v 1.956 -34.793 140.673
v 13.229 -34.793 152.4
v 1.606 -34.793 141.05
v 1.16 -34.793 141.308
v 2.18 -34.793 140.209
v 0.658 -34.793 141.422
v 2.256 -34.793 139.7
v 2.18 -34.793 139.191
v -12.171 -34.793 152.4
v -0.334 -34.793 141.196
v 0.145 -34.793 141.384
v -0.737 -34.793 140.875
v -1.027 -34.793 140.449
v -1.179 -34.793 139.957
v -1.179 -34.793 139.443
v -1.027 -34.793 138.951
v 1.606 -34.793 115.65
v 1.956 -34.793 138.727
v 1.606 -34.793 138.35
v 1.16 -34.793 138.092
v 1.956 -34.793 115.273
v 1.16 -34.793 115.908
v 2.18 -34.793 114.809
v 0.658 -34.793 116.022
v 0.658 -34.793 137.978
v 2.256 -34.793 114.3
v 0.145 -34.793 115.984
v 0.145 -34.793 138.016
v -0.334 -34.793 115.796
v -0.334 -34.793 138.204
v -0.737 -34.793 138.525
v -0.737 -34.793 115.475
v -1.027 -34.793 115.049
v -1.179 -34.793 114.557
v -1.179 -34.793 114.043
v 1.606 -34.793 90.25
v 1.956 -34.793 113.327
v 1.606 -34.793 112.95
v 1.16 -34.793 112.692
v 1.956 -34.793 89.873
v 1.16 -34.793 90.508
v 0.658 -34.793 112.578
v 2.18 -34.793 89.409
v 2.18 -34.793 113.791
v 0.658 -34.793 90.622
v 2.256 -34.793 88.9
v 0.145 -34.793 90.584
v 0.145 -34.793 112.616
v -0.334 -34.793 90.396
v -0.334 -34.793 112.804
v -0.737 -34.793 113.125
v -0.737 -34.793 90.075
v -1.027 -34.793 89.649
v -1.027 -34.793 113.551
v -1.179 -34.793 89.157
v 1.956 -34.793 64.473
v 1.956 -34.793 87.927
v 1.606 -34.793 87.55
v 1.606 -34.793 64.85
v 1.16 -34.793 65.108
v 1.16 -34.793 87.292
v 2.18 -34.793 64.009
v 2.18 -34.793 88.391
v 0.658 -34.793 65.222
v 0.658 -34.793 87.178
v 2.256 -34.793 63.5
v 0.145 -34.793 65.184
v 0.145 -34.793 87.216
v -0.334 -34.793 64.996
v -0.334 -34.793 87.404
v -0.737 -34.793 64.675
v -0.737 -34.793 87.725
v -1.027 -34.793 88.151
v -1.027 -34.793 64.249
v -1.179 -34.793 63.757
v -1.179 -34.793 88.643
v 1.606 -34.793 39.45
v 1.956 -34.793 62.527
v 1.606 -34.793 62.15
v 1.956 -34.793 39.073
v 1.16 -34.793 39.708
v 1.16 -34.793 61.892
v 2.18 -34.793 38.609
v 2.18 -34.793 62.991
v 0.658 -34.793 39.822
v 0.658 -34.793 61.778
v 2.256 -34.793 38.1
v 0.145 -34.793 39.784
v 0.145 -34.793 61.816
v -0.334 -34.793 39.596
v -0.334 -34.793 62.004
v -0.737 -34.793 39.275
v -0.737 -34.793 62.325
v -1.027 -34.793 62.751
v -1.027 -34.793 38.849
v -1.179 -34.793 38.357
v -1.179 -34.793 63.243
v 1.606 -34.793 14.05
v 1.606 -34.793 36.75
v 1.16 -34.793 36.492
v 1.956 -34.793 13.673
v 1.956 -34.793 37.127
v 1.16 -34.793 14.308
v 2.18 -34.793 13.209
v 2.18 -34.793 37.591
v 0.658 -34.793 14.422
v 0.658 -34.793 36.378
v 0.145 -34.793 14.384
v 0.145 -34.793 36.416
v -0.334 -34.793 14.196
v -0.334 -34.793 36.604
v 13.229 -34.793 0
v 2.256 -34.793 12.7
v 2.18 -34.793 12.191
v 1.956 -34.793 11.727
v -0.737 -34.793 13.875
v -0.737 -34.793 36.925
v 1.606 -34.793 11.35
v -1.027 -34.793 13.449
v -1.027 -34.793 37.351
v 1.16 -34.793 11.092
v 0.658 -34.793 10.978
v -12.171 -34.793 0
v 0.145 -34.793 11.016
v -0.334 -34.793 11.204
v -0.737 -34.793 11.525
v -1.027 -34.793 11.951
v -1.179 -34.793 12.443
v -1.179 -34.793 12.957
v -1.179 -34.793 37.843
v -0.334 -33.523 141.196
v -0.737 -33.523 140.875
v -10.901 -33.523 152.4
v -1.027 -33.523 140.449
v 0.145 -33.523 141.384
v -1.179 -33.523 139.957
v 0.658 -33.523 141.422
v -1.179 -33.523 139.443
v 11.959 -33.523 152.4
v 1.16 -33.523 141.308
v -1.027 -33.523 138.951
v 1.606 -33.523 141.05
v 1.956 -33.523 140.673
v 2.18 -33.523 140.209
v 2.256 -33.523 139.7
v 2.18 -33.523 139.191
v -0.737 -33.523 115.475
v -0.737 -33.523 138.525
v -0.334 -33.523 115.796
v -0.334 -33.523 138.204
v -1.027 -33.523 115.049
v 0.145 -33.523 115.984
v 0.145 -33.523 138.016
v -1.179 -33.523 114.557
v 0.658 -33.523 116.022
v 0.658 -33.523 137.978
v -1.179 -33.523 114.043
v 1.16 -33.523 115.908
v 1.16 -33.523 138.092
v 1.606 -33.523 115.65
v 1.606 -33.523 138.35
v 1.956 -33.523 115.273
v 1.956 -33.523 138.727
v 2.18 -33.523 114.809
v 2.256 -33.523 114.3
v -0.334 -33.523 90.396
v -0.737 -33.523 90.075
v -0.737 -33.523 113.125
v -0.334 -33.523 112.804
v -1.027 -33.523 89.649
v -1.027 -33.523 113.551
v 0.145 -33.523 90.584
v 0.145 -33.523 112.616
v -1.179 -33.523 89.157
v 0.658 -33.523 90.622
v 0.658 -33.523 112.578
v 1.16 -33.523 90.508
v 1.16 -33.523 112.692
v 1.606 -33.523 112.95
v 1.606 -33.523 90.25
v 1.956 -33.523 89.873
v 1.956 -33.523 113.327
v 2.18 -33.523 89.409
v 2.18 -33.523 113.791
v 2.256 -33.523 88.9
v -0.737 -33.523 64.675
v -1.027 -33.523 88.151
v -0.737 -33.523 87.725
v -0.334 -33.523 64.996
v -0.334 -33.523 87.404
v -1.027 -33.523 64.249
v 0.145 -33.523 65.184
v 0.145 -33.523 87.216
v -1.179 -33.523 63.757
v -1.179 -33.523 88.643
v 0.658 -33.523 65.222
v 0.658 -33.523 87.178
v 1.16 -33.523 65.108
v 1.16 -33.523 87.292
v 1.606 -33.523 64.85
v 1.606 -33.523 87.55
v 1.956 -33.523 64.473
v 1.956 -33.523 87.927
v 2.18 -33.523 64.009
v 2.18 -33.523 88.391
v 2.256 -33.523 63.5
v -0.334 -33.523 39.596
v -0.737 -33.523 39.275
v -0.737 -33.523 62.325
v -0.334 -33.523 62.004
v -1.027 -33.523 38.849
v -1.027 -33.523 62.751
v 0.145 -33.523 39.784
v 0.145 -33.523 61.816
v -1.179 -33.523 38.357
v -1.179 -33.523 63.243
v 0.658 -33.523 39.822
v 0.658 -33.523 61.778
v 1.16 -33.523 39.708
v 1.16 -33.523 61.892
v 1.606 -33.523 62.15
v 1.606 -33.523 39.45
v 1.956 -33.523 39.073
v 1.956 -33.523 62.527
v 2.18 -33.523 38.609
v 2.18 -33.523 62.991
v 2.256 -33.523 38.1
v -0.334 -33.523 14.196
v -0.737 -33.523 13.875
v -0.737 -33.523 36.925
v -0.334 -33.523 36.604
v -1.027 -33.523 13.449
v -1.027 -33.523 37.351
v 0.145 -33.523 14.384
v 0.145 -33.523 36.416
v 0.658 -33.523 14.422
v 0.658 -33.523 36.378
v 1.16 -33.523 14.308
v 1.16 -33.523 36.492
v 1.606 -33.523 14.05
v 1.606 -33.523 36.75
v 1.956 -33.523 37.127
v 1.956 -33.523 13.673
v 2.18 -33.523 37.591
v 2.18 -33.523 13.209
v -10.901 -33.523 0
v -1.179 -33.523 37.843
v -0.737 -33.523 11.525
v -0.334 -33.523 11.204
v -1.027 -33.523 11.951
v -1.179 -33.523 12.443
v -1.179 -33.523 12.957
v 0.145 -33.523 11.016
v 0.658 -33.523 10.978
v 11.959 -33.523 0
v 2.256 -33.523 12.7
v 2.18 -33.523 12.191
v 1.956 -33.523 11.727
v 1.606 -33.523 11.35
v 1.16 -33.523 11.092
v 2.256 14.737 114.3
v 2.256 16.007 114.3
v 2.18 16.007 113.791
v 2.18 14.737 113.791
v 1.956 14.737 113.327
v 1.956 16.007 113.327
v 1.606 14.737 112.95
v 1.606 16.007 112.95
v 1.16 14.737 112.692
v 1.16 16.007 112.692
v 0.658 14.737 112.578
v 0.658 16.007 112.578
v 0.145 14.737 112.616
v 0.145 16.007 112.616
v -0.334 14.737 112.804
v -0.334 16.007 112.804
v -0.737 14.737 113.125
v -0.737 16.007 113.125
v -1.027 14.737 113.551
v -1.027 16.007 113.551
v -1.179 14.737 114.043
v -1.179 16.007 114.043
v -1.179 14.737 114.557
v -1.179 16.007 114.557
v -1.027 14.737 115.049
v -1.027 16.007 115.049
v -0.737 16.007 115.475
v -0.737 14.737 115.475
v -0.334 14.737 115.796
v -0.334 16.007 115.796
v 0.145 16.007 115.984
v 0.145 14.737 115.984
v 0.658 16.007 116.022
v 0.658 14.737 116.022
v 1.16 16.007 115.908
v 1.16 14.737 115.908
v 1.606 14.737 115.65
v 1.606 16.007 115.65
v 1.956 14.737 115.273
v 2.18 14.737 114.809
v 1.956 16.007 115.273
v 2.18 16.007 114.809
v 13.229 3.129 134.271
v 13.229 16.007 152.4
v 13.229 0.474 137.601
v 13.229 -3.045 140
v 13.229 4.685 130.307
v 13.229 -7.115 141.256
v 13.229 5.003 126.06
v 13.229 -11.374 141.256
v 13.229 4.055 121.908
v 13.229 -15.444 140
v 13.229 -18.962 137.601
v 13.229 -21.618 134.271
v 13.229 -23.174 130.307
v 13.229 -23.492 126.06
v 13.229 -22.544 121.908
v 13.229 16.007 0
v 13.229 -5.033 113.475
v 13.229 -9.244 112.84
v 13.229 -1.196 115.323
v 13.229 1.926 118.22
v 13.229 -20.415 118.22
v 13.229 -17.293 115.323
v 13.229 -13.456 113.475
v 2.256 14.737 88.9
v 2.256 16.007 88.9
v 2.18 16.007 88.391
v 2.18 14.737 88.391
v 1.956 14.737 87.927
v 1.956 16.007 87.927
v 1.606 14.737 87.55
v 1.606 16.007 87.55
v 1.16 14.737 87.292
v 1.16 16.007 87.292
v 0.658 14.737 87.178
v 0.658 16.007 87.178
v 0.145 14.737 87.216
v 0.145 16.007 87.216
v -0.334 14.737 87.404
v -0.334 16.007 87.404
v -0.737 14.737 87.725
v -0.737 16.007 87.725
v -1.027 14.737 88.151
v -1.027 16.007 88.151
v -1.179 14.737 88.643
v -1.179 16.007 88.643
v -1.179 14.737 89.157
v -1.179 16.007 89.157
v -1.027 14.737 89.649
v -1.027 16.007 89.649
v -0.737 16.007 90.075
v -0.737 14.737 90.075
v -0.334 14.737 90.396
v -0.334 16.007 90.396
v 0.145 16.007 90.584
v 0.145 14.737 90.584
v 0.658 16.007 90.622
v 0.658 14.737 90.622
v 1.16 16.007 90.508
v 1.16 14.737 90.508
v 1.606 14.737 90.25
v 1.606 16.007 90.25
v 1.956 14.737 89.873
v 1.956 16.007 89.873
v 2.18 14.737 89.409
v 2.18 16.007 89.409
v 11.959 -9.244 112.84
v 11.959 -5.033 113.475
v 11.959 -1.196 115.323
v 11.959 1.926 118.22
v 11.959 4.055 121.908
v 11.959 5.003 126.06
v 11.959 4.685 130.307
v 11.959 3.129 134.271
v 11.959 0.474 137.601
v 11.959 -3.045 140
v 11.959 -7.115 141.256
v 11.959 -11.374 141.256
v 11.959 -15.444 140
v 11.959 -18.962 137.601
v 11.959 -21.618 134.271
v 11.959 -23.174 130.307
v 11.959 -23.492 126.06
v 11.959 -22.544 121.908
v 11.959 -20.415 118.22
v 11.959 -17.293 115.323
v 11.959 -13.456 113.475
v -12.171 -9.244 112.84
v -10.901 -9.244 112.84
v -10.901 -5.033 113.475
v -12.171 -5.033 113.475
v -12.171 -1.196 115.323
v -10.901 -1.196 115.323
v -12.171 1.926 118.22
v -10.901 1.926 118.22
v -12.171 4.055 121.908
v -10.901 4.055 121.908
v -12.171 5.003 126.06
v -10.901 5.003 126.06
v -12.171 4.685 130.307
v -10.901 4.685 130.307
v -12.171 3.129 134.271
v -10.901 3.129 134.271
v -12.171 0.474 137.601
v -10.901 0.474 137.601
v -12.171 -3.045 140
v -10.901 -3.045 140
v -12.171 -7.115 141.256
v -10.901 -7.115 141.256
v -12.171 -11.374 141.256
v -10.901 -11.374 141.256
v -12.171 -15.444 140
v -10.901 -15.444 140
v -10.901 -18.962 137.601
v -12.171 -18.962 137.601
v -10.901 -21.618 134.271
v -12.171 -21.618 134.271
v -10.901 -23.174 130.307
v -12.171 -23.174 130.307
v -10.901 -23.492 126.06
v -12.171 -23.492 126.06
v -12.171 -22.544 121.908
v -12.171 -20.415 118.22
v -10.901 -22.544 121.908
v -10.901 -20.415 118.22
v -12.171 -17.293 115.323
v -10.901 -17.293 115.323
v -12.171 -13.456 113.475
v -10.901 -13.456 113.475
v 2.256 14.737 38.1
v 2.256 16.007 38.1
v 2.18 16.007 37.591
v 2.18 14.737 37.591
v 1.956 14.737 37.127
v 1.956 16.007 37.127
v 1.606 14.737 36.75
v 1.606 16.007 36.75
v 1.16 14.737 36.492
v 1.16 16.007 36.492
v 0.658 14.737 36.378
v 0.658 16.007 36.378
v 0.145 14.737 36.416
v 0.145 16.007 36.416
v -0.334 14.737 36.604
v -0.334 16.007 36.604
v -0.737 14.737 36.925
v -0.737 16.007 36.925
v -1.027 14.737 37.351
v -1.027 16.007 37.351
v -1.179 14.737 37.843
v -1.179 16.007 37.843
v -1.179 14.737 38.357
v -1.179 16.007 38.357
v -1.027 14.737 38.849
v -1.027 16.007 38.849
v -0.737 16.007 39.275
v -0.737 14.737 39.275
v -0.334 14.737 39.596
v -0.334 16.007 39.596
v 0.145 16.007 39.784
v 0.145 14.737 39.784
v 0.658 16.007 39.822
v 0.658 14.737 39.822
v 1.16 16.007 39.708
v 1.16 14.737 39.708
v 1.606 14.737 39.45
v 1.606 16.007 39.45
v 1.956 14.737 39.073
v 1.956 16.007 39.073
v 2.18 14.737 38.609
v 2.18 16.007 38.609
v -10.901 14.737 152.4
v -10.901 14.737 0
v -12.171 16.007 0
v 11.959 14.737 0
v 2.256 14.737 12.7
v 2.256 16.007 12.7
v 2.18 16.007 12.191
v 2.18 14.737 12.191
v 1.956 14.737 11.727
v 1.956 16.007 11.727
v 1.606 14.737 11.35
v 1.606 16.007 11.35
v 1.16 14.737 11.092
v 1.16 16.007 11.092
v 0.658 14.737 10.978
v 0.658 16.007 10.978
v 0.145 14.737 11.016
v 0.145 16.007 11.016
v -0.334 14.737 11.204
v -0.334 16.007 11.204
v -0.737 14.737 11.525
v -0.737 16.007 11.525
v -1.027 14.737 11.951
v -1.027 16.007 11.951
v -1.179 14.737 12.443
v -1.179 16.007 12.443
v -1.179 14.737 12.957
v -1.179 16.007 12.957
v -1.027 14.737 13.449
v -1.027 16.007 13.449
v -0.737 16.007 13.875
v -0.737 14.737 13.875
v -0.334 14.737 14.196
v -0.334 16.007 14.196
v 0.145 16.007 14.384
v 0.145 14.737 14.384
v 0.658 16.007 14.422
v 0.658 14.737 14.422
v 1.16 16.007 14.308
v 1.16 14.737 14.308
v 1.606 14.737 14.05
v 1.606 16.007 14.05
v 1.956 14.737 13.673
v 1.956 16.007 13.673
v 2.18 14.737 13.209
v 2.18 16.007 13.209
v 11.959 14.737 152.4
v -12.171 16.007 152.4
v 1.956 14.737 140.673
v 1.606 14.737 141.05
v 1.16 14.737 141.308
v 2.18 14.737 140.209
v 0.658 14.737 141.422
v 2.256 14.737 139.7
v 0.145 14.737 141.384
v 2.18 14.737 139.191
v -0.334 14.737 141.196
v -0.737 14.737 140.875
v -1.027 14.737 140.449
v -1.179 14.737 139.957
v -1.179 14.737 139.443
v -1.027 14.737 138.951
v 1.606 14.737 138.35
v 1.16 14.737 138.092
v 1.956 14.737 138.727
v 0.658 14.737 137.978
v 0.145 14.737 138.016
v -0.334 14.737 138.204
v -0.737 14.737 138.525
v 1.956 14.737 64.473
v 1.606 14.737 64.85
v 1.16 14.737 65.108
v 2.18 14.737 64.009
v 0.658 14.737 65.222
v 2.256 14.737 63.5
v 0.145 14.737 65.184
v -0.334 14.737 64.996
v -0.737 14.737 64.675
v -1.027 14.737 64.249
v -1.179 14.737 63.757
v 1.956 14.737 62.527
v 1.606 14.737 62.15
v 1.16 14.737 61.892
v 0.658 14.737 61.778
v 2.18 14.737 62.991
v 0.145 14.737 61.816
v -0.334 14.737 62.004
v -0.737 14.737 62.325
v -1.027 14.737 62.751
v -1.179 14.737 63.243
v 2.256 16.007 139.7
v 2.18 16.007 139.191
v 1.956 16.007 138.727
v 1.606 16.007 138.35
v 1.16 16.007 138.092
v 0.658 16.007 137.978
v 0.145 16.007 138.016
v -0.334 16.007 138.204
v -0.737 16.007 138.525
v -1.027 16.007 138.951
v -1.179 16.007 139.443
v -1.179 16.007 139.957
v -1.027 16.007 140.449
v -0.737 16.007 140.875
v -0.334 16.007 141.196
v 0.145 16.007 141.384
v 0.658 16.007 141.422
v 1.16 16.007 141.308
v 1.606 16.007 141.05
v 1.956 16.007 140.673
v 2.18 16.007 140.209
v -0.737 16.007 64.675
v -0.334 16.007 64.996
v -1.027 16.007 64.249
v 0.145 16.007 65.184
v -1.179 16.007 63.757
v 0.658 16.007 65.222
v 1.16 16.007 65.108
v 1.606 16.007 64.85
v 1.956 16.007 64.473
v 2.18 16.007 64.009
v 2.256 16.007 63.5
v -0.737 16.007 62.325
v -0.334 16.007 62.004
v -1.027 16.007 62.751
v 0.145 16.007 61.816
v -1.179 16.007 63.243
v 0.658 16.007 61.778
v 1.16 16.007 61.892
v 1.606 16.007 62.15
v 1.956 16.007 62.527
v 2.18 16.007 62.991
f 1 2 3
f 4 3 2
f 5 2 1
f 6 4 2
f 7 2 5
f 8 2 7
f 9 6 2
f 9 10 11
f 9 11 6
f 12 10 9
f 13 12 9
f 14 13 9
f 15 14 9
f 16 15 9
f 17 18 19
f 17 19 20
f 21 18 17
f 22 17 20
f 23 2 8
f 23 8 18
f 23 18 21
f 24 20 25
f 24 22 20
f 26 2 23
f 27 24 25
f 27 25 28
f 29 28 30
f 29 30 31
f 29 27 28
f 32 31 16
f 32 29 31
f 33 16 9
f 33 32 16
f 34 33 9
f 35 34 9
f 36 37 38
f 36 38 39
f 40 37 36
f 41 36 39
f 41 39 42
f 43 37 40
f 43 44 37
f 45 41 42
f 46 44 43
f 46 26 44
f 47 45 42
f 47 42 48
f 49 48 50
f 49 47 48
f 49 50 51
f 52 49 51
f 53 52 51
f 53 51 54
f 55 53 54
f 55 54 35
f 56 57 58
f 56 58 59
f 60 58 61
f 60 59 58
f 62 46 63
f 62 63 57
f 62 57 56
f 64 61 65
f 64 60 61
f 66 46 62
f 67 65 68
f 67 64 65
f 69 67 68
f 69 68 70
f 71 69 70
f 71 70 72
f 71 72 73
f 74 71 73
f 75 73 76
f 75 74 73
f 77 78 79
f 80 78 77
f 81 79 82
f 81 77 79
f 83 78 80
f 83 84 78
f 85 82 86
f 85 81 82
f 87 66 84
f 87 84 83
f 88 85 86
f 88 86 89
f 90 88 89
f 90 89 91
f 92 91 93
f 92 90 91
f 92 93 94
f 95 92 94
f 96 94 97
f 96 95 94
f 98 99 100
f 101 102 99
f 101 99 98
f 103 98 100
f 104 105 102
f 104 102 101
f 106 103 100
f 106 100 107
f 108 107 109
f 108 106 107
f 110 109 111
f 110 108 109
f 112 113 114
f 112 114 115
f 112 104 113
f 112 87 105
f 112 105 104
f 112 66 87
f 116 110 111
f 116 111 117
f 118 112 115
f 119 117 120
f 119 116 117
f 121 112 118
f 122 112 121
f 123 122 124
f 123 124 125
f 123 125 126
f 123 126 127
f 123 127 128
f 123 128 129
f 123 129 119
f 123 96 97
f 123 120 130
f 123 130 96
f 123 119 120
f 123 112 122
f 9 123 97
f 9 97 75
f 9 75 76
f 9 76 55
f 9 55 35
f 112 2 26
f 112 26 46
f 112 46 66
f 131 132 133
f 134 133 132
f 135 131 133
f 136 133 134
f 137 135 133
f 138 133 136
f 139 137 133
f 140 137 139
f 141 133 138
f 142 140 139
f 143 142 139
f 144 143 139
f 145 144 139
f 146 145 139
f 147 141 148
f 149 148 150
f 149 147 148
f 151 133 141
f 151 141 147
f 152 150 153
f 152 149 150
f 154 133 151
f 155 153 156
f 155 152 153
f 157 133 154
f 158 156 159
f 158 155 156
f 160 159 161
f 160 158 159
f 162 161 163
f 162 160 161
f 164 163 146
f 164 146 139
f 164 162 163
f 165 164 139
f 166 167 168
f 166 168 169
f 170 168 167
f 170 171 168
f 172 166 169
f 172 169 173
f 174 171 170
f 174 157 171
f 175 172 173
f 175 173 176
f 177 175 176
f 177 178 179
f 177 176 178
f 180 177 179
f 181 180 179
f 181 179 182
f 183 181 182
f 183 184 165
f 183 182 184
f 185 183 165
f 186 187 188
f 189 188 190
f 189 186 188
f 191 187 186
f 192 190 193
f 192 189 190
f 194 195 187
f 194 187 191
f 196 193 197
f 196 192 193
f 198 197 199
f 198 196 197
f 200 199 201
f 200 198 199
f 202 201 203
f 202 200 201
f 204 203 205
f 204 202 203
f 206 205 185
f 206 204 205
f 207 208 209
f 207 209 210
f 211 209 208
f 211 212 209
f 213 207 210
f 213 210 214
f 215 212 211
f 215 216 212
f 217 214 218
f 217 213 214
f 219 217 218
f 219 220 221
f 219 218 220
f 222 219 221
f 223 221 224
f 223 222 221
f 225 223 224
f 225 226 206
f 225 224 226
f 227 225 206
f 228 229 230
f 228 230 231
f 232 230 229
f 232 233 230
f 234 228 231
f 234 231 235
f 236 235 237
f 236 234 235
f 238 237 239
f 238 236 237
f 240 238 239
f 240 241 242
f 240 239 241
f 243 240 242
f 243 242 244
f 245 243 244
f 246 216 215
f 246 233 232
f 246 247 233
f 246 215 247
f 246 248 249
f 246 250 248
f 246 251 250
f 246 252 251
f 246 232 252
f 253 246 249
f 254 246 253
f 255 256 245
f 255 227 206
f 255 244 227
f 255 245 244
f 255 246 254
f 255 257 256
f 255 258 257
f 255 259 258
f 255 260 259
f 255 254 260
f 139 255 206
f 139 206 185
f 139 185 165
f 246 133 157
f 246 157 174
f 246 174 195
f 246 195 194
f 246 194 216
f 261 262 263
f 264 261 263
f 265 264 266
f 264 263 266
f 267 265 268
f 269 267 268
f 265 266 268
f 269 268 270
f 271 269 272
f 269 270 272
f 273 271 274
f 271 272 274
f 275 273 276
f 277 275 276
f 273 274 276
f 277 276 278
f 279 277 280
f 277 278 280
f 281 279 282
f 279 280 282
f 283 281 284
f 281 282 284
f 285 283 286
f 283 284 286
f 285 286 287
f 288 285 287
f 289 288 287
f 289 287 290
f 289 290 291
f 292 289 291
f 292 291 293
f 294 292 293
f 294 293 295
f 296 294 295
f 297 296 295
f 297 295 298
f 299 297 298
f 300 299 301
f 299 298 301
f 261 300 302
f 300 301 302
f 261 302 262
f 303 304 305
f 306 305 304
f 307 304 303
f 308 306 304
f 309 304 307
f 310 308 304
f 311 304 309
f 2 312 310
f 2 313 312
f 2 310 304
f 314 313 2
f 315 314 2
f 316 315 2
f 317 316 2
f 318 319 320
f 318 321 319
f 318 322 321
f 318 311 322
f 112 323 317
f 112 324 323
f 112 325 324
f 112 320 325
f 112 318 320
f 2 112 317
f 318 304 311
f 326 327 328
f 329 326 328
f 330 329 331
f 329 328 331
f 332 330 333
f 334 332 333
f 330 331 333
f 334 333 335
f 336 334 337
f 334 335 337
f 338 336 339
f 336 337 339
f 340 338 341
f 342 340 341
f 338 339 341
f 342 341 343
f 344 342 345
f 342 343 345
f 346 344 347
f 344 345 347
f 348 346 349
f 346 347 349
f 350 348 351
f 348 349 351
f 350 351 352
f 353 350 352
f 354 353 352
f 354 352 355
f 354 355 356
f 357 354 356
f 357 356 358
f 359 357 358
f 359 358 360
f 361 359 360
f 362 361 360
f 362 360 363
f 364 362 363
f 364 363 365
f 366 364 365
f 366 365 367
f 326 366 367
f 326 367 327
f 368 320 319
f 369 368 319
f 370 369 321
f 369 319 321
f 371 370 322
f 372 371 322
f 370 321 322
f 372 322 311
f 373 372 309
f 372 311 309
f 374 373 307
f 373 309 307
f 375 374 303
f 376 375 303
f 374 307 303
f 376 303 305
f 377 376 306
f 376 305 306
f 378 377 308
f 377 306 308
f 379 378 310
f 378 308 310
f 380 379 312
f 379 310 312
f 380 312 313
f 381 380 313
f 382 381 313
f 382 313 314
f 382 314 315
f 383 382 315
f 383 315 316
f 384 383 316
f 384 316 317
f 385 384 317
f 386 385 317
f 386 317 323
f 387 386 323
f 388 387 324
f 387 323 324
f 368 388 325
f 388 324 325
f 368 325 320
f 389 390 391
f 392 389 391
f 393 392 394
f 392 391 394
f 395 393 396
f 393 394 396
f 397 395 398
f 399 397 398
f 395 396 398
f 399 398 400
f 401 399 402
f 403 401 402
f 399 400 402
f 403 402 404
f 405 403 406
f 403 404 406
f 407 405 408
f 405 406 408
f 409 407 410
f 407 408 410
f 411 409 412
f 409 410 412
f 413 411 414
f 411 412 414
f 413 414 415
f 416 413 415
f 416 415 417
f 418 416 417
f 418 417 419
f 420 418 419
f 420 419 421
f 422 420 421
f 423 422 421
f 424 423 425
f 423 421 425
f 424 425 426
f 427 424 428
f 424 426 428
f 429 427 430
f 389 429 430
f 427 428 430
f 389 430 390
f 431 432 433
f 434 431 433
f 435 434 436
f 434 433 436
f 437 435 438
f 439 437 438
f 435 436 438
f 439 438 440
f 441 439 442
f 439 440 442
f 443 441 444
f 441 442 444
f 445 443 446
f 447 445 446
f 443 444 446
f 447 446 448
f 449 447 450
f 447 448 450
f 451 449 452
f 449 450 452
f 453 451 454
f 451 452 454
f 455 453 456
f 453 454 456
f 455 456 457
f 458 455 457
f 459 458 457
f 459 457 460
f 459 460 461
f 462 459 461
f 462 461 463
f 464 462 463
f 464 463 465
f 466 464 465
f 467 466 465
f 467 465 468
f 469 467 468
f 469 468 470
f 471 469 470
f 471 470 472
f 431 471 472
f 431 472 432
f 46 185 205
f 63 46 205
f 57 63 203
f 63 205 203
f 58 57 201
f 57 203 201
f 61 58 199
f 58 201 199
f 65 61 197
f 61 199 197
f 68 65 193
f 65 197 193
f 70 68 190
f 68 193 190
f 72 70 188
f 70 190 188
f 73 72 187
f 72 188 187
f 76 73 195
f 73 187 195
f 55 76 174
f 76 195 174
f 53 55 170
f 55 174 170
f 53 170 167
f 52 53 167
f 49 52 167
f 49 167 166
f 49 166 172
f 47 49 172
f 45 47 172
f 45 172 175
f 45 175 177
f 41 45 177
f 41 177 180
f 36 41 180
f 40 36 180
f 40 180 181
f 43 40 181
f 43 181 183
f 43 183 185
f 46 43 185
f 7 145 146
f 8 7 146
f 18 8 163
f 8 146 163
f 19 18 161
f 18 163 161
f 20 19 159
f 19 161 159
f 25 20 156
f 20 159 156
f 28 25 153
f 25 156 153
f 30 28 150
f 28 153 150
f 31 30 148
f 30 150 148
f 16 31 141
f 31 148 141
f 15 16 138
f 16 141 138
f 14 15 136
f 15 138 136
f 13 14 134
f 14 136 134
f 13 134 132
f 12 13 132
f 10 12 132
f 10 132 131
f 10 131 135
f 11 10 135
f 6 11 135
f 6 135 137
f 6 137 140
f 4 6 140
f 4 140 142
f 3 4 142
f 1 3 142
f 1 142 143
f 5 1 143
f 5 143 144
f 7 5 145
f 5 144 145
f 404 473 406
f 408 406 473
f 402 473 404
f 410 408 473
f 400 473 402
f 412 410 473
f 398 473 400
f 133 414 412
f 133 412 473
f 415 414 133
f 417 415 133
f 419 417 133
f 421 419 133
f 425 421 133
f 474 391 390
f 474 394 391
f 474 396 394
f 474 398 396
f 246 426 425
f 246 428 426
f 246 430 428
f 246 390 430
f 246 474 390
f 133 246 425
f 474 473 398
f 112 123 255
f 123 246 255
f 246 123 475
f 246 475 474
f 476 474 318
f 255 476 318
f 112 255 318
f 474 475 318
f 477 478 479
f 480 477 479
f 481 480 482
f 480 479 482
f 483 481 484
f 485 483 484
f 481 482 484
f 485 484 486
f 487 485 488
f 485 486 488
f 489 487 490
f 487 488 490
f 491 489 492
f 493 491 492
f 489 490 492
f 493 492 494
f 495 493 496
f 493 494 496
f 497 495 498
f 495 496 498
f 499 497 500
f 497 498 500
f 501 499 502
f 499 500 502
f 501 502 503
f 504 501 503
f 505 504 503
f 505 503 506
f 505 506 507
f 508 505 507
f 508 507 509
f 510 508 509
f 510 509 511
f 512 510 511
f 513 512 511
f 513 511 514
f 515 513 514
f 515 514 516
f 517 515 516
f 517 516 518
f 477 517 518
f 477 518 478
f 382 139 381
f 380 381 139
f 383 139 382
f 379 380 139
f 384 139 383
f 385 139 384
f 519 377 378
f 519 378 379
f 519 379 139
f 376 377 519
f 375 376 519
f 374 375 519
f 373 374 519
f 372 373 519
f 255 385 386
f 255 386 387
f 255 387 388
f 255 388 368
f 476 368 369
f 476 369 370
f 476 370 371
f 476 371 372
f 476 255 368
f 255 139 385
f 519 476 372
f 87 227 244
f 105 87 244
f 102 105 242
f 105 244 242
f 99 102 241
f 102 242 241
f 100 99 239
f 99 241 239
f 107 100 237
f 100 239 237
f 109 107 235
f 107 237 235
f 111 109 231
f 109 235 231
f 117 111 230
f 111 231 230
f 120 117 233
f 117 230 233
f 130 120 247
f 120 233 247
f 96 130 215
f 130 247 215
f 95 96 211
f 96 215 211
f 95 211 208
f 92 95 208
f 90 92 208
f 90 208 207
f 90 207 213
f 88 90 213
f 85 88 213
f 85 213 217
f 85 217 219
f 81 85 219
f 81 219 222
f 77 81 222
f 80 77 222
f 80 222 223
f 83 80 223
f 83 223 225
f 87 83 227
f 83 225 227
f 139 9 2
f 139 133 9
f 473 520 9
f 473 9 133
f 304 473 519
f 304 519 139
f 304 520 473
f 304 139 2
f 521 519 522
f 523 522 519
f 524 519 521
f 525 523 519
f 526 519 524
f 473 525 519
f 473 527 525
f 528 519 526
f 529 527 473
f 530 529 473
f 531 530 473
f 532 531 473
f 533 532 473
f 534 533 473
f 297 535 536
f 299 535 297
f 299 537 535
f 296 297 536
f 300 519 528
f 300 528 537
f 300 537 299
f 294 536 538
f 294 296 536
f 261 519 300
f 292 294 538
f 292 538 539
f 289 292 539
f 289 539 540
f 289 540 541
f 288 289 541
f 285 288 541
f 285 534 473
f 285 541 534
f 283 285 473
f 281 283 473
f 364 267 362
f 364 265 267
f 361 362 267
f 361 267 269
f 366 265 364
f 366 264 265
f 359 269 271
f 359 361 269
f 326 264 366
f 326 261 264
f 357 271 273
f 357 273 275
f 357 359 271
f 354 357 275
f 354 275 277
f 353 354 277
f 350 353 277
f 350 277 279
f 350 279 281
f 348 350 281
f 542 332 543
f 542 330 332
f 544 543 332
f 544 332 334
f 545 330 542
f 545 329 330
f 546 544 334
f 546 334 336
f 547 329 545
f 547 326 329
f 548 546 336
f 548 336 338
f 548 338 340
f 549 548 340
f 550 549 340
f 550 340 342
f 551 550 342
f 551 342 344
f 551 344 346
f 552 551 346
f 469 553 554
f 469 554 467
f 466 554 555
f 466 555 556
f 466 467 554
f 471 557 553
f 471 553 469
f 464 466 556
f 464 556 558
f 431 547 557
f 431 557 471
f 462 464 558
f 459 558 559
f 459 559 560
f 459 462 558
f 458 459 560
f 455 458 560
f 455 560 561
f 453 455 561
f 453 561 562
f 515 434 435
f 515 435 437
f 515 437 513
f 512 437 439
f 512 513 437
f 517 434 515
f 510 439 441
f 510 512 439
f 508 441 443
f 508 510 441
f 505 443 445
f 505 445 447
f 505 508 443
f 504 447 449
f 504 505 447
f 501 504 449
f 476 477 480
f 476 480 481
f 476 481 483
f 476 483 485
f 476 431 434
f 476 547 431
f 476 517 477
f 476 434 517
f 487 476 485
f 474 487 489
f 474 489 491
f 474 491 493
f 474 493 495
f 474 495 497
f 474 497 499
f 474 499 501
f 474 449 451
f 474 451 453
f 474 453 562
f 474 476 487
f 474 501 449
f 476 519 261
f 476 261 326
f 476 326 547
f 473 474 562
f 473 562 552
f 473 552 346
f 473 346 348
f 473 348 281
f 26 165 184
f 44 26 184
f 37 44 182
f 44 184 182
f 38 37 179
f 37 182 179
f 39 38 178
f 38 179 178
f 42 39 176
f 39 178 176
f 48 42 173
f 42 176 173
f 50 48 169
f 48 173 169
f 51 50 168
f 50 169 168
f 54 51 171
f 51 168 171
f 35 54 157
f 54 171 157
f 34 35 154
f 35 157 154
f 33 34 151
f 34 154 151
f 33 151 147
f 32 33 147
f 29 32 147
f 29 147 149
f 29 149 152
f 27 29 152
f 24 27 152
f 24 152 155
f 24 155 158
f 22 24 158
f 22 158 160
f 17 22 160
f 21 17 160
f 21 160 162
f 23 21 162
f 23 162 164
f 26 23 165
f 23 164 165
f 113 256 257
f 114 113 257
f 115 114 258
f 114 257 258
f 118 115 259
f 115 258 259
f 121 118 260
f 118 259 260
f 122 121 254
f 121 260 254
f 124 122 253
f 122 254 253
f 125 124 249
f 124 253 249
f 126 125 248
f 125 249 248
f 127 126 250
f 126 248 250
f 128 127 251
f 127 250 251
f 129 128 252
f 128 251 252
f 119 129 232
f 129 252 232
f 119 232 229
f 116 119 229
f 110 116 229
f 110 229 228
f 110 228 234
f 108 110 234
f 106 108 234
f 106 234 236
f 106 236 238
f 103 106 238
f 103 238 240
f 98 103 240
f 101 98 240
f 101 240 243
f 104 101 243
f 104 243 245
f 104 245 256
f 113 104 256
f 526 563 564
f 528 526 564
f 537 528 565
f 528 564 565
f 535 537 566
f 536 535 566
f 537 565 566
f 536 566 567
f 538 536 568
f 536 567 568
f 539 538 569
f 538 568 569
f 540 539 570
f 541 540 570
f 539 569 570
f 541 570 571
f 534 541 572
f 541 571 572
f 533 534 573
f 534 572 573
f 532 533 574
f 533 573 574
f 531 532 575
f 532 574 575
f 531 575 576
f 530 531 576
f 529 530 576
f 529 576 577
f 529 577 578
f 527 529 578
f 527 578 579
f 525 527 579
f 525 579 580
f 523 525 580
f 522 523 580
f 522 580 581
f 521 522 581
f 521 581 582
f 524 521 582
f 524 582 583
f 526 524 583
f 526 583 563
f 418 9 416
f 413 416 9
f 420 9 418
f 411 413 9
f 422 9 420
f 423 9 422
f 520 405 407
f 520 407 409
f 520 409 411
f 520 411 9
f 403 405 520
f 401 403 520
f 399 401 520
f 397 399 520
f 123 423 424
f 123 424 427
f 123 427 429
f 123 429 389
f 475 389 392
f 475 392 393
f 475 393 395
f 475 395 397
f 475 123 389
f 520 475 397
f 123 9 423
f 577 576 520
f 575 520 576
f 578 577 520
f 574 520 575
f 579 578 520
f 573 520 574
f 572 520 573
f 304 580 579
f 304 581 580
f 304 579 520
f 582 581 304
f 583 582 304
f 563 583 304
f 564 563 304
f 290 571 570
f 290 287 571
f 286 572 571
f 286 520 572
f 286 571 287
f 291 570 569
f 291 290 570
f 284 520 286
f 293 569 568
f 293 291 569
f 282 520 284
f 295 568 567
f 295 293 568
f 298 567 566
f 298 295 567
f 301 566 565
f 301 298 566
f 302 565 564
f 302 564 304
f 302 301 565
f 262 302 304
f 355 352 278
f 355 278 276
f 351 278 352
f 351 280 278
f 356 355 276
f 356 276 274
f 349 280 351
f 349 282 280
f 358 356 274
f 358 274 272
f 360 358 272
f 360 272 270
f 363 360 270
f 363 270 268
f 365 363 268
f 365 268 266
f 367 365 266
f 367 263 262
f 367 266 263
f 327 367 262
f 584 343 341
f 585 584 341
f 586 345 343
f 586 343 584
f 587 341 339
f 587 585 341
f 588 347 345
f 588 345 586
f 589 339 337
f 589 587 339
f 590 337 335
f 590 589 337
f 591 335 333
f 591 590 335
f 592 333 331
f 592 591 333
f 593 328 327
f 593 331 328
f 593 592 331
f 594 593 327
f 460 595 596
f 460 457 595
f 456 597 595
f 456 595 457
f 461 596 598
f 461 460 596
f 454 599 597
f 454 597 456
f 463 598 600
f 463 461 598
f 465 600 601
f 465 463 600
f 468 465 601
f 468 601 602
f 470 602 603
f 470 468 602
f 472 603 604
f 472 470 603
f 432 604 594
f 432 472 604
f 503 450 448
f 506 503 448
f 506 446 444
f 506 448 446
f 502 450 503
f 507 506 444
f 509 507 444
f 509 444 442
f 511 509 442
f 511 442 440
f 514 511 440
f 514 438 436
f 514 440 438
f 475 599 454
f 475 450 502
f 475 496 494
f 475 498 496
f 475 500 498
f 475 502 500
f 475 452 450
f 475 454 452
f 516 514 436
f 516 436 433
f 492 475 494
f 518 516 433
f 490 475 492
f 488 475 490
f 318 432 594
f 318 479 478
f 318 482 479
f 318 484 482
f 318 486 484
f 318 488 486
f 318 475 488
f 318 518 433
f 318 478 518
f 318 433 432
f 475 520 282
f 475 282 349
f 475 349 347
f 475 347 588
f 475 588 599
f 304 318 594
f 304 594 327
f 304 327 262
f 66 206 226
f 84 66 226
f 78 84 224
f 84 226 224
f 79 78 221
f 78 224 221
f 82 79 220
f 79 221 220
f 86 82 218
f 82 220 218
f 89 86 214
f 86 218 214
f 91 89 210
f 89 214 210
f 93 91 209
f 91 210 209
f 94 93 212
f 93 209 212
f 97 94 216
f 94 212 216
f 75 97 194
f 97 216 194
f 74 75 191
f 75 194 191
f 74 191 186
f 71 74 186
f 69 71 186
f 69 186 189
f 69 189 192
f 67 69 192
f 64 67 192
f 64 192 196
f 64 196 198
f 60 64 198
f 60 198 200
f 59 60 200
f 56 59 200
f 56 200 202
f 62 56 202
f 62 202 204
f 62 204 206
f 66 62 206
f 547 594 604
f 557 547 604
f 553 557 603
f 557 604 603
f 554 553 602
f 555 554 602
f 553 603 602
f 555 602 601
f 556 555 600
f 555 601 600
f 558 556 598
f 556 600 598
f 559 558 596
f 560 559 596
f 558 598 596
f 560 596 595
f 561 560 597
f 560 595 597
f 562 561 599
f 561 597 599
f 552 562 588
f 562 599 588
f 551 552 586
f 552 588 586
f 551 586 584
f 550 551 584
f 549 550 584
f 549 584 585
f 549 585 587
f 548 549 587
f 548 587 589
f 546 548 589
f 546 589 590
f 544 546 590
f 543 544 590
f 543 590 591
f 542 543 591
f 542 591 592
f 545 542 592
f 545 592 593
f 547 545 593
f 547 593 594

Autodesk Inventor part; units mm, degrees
ref_plane "YZ Plane" through (0, 0, 0) normal (1, 0, 0) x (0, 1, 0)
ref_plane "XZ Plane" through (0, 0, 0) normal (0, 1, 0) x (-1, 0, 0)
ref_plane "XY Plane" through (0, 0, 0) normal (0, 0, 1) x (1, 0, 0)
sketch "Sketch1" plane through (0, 0, 0) normal (0, 0, 1) x (1, 0, 0)
  line L0 (-12.1708, 16.0073) -> (13.2292, 16.0073)
  line L1 (13.2292, 16.0073) -> (13.2292, -34.7927)
  line L2 (13.2292, -34.7927) -> (-12.1708, -34.7927)
  line L3 (-12.1708, -34.7927) -> (-12.1708, 16.0073)
  line L4 (11.9592, 14.7373) -> (-10.9008, 14.7373)
  line L5 (-10.9008, 14.7373) -> (-10.9008, -33.5227)
  line L6 (-10.9008, -33.5227) -> (11.9592, -33.5227)
  line L7 (11.9592, -33.5227) -> (11.9592, 14.7373)
  point P0 (0, 0)
  dimension "d0" = 25.4
  dimension "d1" = 50.8
  dimension "d2" = 1.27
extrude "Extrusion1" add sketch "Sketch1" along normal blind 152.4
sketch "Sketch2" plane through (-12.1708, 16.0073, 0) normal (0, 1, 0) x (1, 0, 0)
  circle A0 centre (12.7, -12.7) radius 1.7272
  line L0 (25.4, 0) -> (0, 0) projected
  line L1 (0, 0) -> (0, -152.4) projected
  point P0 (12.1708, 0)
  dimension "d5" = 3.4544
  dimension "d6" = 12.7
  dimension "d7" = 12.7
extrude "Extrusion2" cut sketch "Sketch2" against normal through all
pattern_linear "Rectangular Pattern1" count 6 spacing 25.4 along (0, 0, 1) of "Extrusion2"
sketch "Sketch3" plane through (13.2292, -34.7927, 0) normal (1, 0, 0) x (0, 0, -1)
  circle A0 centre (-127.1277, 25.5483) radius 14.2875
  line L0 (-152.5277, 50.9483) -> (-127.1277, 25.5483) construction
  point P0 (0, 34.7927)
  dimension "d15" = 25.4
  dimension "d16" = 25.4
  dimension "d17" = 28.575
extrude "Extrusion3" cut sketch "Sketch3" against normal through all
equation "\"d3\" = d13"
equation "\"d13\" = 152.4"
properties part number "VerseFrame 6in w Bearing Hole"
